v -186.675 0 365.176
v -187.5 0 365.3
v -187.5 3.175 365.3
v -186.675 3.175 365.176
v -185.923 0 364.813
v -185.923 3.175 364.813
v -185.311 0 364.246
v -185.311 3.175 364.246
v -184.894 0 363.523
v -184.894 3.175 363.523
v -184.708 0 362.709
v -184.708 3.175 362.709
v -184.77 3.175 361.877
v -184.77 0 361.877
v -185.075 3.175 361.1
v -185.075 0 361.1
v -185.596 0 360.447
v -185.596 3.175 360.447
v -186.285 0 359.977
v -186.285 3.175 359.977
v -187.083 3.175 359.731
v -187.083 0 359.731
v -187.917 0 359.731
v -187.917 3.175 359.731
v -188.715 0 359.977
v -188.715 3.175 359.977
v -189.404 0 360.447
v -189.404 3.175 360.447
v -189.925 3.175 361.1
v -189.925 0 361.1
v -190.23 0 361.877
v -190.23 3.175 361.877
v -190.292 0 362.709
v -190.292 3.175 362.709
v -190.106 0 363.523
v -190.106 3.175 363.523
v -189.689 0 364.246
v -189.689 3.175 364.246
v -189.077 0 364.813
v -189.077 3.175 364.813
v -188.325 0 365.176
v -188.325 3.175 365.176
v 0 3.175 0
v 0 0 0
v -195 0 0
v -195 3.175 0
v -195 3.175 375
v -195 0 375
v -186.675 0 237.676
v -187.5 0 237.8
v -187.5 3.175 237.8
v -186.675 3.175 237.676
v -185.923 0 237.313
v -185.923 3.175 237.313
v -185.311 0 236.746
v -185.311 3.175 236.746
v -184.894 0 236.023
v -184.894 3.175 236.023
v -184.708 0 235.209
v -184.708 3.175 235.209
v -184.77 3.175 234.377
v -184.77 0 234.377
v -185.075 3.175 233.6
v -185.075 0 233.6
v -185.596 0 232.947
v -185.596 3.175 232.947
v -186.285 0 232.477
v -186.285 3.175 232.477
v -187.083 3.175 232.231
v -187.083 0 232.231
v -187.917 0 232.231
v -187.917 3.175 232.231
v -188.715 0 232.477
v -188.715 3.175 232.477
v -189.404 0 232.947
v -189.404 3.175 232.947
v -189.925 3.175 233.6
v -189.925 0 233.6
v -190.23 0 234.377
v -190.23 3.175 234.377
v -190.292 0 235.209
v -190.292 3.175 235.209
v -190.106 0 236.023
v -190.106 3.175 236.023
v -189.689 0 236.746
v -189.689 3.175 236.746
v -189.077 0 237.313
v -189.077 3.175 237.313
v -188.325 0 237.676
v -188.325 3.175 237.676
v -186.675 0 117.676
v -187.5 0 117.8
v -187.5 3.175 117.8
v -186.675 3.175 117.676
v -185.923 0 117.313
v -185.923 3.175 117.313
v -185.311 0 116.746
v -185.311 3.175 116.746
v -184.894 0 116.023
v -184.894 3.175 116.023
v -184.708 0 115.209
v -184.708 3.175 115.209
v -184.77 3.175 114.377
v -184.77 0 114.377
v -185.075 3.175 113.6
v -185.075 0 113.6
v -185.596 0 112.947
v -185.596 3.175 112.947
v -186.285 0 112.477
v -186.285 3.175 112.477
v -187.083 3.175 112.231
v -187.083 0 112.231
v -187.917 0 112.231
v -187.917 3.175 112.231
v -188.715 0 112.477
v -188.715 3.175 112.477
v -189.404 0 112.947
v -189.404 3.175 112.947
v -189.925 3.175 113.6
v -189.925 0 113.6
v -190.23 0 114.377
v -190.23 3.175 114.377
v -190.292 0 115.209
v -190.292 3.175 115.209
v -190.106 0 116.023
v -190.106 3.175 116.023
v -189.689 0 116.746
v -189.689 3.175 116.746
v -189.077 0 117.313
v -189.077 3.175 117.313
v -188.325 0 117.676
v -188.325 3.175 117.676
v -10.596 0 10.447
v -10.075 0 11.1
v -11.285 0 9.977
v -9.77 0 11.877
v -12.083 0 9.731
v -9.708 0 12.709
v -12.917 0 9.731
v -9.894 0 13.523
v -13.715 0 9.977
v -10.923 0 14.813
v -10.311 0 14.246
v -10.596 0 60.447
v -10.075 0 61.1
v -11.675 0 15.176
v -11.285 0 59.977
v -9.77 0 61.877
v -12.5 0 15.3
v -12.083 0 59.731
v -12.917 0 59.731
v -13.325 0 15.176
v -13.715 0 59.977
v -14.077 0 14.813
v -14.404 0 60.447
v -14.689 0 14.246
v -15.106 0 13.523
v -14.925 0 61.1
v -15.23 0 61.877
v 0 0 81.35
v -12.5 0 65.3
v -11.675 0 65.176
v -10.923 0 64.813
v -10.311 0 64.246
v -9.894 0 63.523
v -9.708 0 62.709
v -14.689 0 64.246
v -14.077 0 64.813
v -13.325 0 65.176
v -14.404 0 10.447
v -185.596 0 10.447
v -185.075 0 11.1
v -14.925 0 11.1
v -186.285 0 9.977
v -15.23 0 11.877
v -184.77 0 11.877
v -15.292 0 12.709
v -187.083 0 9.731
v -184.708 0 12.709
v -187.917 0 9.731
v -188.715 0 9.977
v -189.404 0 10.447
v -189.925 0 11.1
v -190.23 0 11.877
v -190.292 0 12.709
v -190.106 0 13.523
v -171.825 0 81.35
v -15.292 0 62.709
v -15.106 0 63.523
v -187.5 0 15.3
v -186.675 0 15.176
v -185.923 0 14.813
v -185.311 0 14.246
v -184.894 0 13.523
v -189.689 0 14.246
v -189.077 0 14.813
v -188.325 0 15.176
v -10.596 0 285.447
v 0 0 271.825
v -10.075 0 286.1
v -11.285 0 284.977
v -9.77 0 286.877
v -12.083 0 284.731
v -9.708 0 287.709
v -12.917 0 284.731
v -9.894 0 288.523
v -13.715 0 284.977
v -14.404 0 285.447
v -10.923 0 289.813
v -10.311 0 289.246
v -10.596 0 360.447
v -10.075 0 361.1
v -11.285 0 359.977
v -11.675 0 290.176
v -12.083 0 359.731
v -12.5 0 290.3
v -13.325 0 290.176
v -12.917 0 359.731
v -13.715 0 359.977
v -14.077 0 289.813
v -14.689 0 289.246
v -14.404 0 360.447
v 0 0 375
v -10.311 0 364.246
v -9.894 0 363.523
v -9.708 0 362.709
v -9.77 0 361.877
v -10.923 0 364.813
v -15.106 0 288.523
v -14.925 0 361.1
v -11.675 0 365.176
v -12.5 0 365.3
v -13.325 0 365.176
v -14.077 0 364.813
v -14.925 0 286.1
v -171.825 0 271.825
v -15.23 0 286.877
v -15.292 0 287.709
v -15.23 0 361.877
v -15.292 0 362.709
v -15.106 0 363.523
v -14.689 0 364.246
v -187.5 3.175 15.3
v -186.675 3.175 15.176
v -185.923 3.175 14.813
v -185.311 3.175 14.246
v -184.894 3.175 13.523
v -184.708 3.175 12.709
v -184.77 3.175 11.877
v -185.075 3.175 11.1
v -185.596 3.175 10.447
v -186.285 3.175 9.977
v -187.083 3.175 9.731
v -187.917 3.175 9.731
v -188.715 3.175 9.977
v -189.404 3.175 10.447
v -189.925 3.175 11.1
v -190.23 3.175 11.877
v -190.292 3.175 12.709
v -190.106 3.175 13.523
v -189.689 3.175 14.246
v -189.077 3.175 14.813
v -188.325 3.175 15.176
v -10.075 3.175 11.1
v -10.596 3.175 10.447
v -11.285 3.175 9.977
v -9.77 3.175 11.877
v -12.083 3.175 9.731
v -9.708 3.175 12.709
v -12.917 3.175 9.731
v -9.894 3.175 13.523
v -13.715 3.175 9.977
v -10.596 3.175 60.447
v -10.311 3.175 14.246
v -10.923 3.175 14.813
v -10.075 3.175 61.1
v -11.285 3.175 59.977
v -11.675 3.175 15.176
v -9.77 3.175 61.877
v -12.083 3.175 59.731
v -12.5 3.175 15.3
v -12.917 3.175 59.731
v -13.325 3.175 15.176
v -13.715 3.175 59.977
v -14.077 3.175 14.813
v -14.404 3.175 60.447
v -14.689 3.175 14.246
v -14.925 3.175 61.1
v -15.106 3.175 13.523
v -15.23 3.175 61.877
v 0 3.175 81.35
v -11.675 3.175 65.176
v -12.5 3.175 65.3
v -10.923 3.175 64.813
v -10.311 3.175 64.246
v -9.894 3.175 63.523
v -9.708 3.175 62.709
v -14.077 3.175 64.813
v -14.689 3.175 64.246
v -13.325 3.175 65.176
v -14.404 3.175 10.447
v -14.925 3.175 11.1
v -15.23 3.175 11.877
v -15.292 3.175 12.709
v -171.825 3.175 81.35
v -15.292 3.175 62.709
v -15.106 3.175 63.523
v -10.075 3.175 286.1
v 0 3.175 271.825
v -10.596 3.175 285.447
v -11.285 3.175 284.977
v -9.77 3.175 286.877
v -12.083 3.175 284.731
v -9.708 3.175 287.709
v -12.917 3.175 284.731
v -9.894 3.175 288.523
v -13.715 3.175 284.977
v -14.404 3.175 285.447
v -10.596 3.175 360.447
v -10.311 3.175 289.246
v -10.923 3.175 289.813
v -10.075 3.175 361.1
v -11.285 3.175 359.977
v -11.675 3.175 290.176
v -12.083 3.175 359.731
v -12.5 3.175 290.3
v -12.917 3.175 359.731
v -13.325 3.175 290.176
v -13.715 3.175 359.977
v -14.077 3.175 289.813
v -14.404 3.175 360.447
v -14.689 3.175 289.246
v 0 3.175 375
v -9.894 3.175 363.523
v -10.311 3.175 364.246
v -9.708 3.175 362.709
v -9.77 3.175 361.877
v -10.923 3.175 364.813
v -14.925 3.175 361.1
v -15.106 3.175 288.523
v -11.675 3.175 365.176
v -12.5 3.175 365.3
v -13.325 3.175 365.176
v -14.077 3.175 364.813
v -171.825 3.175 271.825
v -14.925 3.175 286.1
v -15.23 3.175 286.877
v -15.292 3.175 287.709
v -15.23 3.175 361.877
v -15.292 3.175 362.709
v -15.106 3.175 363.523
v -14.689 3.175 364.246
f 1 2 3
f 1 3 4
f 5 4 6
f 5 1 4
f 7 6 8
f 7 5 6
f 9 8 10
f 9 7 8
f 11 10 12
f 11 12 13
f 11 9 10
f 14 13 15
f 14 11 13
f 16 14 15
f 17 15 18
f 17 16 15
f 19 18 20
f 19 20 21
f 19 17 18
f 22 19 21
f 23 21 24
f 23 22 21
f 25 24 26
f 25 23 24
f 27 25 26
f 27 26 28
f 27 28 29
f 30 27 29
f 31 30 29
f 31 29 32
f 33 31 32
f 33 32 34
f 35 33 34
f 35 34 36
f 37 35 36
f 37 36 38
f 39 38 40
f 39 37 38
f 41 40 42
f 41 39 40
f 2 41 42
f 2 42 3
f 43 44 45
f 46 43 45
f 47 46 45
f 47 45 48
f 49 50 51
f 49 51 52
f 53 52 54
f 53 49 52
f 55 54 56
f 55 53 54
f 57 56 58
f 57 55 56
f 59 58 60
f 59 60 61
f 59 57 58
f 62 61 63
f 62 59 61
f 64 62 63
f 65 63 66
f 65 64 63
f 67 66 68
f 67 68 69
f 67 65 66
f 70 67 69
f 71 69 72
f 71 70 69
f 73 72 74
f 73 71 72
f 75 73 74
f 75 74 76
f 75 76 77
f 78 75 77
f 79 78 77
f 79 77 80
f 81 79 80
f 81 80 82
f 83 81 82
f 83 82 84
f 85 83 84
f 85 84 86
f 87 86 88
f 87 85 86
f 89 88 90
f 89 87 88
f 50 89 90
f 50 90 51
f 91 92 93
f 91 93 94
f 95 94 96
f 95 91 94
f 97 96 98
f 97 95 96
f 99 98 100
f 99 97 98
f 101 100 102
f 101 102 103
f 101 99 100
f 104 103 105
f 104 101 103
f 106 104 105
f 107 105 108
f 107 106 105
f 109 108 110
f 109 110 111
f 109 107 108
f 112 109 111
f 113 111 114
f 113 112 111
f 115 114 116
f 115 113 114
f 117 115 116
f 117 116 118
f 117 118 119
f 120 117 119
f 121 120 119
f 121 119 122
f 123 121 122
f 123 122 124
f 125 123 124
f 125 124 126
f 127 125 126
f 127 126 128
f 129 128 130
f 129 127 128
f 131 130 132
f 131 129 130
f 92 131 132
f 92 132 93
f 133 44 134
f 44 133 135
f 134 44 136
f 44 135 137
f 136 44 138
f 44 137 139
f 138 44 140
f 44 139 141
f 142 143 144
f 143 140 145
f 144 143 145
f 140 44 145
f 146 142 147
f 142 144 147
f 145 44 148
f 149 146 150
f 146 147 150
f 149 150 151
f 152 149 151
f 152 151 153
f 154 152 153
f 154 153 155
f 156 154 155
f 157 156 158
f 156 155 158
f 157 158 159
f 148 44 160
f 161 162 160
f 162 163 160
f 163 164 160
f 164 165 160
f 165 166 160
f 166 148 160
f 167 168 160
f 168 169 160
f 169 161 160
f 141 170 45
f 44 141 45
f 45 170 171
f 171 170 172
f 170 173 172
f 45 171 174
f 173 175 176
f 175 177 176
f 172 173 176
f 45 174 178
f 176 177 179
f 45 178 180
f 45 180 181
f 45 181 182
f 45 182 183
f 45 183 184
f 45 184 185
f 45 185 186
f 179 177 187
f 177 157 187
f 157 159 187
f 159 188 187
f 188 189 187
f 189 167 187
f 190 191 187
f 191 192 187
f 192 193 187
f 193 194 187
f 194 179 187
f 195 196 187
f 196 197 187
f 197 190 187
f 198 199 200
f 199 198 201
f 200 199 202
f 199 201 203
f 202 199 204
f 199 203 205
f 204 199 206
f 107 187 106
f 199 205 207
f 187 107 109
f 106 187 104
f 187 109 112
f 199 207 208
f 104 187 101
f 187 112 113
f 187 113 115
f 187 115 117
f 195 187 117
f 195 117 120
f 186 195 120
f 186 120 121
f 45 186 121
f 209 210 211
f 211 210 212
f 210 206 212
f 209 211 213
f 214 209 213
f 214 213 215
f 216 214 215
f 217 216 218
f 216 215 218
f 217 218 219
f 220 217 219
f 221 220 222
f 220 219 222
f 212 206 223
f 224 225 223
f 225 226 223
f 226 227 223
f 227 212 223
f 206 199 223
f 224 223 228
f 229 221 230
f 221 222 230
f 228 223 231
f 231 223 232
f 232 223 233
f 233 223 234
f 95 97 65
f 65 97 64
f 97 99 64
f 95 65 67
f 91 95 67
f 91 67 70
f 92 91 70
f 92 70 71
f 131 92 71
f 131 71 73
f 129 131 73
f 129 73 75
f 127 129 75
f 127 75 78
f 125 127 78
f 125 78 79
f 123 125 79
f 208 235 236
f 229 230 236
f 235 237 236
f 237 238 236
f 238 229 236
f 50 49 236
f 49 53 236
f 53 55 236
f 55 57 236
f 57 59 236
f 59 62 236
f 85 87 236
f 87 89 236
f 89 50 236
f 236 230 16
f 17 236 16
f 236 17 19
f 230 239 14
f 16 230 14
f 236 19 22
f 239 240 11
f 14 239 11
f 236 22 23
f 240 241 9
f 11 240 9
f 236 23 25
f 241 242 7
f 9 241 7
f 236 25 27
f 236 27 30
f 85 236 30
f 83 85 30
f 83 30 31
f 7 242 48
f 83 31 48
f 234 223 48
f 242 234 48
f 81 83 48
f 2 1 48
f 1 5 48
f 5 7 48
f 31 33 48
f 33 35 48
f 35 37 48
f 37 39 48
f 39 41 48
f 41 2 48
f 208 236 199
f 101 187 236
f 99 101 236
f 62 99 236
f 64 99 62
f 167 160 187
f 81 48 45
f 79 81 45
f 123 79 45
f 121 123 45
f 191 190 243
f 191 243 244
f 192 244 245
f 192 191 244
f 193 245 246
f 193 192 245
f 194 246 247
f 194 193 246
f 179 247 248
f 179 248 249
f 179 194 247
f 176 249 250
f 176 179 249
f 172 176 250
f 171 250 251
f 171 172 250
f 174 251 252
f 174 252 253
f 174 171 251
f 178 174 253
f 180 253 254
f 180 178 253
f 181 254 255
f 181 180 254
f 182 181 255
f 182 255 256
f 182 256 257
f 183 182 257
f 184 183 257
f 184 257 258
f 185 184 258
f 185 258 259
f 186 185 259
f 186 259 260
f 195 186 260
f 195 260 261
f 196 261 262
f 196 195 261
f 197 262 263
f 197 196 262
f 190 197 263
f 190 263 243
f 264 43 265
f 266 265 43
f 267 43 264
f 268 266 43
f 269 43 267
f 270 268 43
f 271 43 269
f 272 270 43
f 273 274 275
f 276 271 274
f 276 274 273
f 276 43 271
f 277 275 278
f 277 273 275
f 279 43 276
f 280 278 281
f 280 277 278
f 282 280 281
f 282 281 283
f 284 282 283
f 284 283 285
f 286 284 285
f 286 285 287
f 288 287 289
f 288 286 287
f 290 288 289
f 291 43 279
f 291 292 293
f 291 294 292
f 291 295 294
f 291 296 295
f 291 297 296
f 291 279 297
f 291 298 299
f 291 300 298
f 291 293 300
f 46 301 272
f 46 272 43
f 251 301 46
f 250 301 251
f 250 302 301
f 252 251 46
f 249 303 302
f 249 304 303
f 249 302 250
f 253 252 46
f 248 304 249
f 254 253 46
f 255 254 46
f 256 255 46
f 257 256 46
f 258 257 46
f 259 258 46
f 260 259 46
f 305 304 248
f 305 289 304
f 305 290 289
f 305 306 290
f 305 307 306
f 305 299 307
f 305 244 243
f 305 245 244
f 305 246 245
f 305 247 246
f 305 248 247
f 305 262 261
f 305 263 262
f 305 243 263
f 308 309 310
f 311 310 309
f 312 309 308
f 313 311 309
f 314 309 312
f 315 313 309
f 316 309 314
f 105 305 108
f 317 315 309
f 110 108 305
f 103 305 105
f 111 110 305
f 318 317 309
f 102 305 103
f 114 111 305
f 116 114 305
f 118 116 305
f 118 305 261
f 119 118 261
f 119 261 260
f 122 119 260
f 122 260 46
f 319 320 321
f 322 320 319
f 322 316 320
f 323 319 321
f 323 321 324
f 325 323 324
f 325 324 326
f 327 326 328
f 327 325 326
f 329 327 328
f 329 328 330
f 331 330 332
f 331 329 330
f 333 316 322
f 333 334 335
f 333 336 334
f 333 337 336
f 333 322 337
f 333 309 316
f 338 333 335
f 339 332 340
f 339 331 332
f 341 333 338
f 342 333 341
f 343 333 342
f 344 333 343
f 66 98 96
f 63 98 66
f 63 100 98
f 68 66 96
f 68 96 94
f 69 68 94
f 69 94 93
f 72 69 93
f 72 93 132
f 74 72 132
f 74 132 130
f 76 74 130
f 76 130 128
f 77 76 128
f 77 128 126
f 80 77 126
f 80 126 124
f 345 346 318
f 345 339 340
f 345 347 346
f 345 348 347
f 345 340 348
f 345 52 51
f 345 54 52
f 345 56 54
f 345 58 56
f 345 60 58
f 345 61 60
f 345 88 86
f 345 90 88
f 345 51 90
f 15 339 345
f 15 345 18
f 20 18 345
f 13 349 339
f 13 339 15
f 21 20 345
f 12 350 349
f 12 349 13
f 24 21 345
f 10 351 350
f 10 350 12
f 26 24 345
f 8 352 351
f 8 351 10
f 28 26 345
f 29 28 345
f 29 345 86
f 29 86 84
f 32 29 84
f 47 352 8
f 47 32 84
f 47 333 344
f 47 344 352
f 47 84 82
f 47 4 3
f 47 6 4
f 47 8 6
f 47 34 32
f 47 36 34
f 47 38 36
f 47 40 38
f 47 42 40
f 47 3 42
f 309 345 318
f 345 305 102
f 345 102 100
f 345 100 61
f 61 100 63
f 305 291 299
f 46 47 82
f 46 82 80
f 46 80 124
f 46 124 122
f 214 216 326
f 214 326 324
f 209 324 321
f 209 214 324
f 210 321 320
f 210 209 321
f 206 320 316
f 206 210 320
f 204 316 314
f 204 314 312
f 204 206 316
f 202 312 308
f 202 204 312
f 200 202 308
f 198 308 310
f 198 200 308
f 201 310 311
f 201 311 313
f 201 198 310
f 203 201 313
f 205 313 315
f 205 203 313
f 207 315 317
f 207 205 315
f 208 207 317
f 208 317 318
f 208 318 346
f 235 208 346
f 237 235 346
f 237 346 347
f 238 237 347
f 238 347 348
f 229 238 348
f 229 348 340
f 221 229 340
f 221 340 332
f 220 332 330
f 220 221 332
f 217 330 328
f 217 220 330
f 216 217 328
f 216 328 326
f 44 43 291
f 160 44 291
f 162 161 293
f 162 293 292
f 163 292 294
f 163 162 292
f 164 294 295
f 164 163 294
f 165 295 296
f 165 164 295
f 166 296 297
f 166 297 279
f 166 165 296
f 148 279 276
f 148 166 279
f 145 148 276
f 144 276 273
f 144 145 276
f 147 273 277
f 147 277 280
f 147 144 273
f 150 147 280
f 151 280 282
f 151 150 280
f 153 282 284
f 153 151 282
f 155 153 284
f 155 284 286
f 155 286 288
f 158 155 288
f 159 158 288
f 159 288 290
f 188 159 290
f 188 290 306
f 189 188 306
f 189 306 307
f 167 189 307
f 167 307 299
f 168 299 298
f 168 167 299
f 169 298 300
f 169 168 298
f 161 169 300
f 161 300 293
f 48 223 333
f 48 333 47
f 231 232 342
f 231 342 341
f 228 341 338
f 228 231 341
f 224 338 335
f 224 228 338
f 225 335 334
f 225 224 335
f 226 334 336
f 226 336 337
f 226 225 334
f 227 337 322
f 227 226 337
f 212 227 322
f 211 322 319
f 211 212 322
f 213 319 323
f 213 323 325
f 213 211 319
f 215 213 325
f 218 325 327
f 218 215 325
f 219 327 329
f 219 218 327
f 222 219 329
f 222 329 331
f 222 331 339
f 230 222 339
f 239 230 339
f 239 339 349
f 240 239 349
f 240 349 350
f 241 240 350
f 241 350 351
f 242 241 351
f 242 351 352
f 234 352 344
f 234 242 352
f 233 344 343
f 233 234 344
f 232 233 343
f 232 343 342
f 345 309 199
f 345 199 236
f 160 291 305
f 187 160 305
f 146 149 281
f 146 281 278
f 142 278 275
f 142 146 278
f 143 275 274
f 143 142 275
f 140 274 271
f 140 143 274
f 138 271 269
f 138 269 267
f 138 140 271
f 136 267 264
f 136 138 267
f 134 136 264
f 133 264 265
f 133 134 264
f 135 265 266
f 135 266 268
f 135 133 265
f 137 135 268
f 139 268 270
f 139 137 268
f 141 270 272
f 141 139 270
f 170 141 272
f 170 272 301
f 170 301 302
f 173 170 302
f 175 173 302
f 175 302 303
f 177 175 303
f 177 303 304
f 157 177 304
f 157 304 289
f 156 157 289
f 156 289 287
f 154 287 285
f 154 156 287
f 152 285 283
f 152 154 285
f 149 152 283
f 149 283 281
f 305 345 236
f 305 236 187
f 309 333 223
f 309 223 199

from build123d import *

# Parameters (mm, degrees)
SKETCH1_W           = 200
SKETCH1_H           = 100
SKETCH1_R           = 2.8
SKETCH1_W_2         = 175
SKETCH1_H_2         = 75
BOSS_EXTRUDE1_DEPTH = 3.175
SKETCH2_W           = 171.825
SKETCH2_H           = 6.35
BOSS_EXTRUDE2_DEPTH = 3.175
SKETCH3_W           = 5
SKETCH3_H           = 375
CUT_EXTRUDE1_DEPTH  = 426.011859393


with BuildPart() as part:
    # Sketch1 → Boss-Extrude1 (new body)
    # profile 1 of 3: a face of its own
    with BuildSketch(Plane(origin=(0, 0, 0), x_dir=(-1, 0, 0), z_dir=(0, 1, 0))):
        with Locations((100, 325)):
            Rectangle(SKETCH1_W, SKETCH1_H)
        with Locations(Location((187.5, 362.5, 0), (0, 0, 90))):
            Circle(SKETCH1_R, mode=Mode.SUBTRACT)
        with Locations(Location((12.5, 287.5, 0), (0, 0, 90))):
            Circle(SKETCH1_R, mode=Mode.SUBTRACT)
        with Locations(Location((12.5, 362.5, 0), (0, 0, 90))):
            Circle(SKETCH1_R, mode=Mode.SUBTRACT)
    # profile 2 of 3: a face of its own
    with BuildSketch(Plane(origin=(0, 0, 0), x_dir=(-1, 0, 0), z_dir=(0, 1, 0))):
        Polygon((200, 275), (175, 275), (175, 75), (175, 0), (200, 0), align=None)
        with Locations(Location((187.5, 12.5, 0), (0, 0, 90))):
            Circle(SKETCH1_R, mode=Mode.SUBTRACT)
        with Locations(Location((187.5, 115, 0), (0, 0, 90))):
            Circle(SKETCH1_R, mode=Mode.SUBTRACT)
        with Locations(Location((187.5, 235, 0), (0, 0, 90))):
            Circle(SKETCH1_R, mode=Mode.SUBTRACT)
    # profile 3 of 3: a face of its own
    with BuildSketch(Plane(origin=(0, 0, 0), x_dir=(-1, 0, 0), z_dir=(0, 1, 0))):
        with Locations((87.5, 37.5)):
            Rectangle(SKETCH1_W_2, SKETCH1_H_2)
        with Locations(Location((12.5, 12.5, 0), (0, 0, 90))):
            Circle(SKETCH1_R, mode=Mode.SUBTRACT)
        with Locations(Location((12.5, 62.5, 0), (0, 0, 90))):
            Circle(SKETCH1_R, mode=Mode.SUBTRACT)
    extrude(amount=BOSS_EXTRUDE1_DEPTH)

    # Sketch2 → Boss-Extrude2 (add, through all)
    with BuildSketch(Plane(origin=(0, 3.175, 0), x_dir=(-1, 0, 0), z_dir=(0, 1, 0))):
        Polygon((175, 275), (0, 275), (0, 271.825), (171.825, 271.825), (175, 271.825), align=None)
        Polygon((175, 75), (175, 271.825), (171.825, 271.825), (171.825, 81.35), (171.825, 75), align=None)
        with Locations((85.9125, 78.175)):
            Rectangle(SKETCH2_W, SKETCH2_H)
    extrude(amount=-BOSS_EXTRUDE2_DEPTH)

    # Sketch3 → Cut-Extrude1 (cut, through all)
    with BuildSketch(Plane(origin=(0, 3.175, 0), x_dir=(-1, 0, 0), z_dir=(0, 1, 0))):
        with Locations((197.5, 187.5)):
            Rectangle(SKETCH3_W, SKETCH3_H)
    extrude(amount=-CUT_EXTRUDE1_DEPTH, mode=Mode.SUBTRACT)


solid = part.part
